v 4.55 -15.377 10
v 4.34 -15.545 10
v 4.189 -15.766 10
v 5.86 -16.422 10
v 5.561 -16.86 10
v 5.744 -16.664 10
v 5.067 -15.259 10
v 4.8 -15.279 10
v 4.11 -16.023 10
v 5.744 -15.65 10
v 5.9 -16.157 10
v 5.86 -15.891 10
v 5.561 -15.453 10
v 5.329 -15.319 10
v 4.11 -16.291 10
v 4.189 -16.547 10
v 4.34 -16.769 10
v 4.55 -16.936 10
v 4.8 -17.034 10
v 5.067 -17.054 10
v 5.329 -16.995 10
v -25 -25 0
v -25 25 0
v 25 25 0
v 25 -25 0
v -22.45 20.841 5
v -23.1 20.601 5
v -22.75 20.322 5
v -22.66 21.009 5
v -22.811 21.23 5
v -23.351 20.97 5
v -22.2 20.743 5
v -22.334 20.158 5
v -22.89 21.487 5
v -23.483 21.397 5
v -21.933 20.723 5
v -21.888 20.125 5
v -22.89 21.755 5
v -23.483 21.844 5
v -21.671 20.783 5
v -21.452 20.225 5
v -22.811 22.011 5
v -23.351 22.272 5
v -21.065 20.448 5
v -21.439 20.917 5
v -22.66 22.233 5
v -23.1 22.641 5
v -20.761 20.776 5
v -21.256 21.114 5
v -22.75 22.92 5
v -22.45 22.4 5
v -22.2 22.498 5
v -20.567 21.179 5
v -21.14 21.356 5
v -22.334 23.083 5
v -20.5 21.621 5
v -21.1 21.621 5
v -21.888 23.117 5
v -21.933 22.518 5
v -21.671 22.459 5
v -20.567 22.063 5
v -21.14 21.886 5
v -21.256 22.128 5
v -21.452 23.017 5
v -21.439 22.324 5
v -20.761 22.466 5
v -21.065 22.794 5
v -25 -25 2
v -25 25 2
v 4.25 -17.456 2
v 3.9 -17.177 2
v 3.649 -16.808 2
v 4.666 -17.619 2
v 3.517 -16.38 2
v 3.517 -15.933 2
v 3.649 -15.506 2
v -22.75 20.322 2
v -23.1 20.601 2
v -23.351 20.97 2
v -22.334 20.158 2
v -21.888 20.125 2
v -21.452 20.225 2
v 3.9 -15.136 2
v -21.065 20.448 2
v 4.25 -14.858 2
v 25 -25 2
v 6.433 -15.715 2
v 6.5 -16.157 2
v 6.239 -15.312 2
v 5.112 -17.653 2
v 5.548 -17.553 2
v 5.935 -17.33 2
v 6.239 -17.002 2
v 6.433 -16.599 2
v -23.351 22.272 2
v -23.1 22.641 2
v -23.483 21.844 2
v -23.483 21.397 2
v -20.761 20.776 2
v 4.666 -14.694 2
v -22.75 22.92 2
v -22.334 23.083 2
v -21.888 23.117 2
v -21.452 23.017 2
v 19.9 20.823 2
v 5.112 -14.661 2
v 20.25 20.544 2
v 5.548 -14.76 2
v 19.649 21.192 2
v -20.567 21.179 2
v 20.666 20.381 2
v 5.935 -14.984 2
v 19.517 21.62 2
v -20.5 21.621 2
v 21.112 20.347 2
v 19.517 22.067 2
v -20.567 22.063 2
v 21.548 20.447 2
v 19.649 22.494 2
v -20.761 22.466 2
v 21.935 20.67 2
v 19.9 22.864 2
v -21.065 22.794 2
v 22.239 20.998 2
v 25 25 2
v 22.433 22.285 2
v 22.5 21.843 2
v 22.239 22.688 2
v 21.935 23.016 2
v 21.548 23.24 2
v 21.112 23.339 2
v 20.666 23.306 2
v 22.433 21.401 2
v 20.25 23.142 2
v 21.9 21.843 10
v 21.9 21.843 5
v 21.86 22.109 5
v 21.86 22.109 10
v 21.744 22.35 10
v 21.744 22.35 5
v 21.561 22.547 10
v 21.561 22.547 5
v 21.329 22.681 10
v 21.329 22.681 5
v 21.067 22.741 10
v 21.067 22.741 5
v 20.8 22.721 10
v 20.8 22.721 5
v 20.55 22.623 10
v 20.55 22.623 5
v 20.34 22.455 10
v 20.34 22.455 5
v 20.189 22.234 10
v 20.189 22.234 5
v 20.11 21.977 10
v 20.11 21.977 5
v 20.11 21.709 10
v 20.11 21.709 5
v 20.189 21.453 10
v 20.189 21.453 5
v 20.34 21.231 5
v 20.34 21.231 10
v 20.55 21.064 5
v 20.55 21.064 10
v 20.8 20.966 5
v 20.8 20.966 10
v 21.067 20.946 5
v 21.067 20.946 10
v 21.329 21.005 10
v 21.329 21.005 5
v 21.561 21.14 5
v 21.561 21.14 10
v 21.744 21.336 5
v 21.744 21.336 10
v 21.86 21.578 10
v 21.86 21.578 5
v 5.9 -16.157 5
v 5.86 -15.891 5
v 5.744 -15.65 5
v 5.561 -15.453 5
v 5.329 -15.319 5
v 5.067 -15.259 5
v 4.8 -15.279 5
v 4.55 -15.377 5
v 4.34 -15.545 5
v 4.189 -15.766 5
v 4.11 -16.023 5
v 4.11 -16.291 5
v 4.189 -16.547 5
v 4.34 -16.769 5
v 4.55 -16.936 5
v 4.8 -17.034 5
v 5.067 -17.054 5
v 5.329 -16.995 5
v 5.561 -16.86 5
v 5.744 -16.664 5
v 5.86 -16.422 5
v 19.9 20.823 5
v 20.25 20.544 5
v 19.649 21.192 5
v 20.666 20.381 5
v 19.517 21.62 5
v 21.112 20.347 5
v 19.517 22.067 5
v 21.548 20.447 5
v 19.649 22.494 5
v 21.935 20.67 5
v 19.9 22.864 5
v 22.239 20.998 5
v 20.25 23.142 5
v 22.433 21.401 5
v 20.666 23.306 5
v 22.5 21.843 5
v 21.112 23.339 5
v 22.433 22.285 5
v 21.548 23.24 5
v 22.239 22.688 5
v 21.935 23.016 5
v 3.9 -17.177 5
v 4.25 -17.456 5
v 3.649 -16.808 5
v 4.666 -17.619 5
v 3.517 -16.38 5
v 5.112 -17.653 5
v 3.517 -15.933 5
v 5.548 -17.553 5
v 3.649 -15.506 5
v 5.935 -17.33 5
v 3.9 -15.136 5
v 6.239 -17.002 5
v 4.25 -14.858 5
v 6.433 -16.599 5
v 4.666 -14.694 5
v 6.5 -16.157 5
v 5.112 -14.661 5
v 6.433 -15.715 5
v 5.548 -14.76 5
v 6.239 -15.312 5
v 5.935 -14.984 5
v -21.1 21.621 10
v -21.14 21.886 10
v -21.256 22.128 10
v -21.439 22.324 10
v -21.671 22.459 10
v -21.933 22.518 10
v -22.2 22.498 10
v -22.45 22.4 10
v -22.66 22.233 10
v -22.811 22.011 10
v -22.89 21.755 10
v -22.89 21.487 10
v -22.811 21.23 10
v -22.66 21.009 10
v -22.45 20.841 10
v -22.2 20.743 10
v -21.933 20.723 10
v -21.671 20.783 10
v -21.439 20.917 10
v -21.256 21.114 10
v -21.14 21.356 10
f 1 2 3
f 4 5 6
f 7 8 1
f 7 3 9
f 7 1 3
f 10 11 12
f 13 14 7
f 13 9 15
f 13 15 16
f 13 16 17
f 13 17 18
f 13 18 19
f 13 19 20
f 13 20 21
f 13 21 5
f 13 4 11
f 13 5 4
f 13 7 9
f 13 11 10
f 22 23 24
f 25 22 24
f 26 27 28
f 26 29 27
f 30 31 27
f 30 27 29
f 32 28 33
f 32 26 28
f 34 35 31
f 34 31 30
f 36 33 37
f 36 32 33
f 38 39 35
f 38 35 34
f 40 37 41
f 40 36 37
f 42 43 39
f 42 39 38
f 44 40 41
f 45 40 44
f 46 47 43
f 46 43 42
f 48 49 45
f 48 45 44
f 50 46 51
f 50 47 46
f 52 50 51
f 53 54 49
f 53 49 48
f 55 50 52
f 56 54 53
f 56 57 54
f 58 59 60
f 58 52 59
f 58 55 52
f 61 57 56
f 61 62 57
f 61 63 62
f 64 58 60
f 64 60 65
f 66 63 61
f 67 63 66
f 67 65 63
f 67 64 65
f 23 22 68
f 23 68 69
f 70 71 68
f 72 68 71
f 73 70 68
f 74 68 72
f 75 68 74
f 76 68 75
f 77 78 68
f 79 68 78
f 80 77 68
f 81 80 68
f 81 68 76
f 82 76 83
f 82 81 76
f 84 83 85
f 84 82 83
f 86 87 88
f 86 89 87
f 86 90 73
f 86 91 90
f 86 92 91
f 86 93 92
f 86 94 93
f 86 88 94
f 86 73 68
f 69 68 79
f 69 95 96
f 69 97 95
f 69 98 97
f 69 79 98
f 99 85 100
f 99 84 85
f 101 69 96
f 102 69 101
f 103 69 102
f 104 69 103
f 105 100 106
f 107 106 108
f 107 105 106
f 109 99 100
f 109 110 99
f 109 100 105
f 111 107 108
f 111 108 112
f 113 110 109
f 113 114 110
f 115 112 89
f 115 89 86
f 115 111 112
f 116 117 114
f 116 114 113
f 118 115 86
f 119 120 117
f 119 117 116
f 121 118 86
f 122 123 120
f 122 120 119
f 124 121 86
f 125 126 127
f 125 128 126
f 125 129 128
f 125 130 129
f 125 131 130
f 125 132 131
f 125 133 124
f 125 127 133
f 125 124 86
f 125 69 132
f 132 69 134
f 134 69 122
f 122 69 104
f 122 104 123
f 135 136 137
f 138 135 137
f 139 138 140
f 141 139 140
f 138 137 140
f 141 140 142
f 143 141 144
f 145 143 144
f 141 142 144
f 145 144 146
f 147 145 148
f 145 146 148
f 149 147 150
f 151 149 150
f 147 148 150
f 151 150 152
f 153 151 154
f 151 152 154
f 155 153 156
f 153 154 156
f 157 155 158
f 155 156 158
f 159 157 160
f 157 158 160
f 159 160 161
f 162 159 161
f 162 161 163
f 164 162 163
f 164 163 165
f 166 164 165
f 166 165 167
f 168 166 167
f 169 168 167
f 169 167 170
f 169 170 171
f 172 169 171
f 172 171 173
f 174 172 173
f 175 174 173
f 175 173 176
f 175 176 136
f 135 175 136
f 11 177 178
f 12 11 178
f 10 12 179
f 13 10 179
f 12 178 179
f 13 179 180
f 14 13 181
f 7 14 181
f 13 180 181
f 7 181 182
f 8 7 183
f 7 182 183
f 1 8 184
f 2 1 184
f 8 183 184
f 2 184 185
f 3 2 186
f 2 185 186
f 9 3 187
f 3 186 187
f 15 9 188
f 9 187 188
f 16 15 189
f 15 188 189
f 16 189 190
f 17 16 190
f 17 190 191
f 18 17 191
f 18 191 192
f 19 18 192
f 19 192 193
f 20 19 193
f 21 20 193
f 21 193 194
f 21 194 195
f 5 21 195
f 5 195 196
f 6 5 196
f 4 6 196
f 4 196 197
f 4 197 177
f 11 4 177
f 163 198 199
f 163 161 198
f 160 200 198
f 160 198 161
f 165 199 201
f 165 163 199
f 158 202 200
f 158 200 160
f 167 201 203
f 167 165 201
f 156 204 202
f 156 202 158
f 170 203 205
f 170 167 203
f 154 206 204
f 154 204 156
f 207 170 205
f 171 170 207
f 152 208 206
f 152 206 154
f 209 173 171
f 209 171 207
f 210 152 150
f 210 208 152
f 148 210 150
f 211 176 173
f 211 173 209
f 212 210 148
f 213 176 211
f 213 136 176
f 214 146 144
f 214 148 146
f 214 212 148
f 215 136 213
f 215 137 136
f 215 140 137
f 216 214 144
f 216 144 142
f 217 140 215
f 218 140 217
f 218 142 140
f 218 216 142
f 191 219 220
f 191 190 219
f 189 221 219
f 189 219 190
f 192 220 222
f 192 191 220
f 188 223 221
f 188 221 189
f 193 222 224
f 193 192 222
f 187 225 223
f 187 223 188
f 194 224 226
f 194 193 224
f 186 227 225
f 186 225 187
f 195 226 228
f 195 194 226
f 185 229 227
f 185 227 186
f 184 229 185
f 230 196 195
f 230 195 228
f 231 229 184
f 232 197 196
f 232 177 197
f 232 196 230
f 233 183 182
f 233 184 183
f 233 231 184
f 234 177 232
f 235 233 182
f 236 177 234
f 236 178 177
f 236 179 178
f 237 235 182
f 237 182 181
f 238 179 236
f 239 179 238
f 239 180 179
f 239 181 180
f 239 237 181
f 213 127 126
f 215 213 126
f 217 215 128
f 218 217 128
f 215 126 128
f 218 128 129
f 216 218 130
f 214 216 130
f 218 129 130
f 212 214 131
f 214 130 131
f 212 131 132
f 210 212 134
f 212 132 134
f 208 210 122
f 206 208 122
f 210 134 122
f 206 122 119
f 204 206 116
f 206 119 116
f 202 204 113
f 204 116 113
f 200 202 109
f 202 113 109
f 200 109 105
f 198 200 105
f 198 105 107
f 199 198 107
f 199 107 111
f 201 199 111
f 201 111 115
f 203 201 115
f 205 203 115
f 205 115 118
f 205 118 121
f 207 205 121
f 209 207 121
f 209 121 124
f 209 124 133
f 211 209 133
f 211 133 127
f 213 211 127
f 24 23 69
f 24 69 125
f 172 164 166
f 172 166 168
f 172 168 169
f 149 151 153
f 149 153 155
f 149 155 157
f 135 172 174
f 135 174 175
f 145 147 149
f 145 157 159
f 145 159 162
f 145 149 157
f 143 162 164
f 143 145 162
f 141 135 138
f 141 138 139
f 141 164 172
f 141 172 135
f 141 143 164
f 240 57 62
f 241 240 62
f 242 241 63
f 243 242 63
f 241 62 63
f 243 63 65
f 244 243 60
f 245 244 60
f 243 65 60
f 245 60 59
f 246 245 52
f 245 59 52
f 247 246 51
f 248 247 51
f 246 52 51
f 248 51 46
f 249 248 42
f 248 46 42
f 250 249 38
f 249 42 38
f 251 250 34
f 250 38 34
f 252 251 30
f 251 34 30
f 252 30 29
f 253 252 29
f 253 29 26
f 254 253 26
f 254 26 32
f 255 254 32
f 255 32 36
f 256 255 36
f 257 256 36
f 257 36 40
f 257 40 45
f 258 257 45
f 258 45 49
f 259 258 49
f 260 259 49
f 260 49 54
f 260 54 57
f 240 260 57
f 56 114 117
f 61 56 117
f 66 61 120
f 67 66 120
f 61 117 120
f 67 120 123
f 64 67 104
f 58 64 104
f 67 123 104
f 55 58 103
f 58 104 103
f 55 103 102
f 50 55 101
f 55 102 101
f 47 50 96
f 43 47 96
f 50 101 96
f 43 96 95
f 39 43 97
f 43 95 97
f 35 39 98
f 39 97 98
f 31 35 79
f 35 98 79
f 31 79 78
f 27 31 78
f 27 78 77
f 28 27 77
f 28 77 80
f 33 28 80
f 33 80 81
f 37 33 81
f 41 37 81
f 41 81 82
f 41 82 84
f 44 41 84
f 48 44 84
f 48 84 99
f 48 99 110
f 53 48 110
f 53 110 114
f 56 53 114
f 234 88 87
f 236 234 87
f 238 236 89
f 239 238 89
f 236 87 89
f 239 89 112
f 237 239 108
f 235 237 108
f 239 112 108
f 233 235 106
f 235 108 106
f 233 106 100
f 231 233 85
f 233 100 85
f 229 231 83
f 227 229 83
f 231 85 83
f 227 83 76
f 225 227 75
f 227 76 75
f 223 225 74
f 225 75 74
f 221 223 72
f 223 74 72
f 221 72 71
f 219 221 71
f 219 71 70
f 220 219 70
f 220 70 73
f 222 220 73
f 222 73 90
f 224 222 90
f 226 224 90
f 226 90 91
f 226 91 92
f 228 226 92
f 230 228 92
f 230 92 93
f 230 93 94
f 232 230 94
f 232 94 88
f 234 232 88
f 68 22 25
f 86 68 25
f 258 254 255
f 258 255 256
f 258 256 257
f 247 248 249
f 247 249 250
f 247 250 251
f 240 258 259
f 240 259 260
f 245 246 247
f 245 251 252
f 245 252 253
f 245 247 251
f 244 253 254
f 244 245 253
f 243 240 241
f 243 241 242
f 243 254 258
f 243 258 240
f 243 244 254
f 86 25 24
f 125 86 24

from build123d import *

# Parameters (mm, degrees)
F0_W     = 50
F0_H     = 50
F0_R     = 1.5
F1_DEPTH = 2
F0_R_2   = 0.9
F2_DEPTH = 5
F3_DEPTH = 10


with BuildPart() as f1:
    # F0 (on Top) → F1 (new body)
    with BuildSketch(Plane.XY):
        Rectangle(F0_W, F0_H)
        with Locations((5, -16.156757)):
            Circle(F0_R, mode=Mode.SUBTRACT)
        with Locations((-22, 21.620819)):
            Circle(F0_R, mode=Mode.SUBTRACT)
        with Locations((21, 21.843243)):
            Circle(F0_R, mode=Mode.SUBTRACT)
    extrude(amount=F1_DEPTH)

    # F0 (on Top) → F2 (join)
    with BuildSketch(Plane.XY):
        with Locations((-22, 21.620819)):
            Circle(F0_R)
        with Locations((-22, 21.620819)):
            Circle(F0_R_2, mode=Mode.SUBTRACT)
        with Locations((21, 21.843243)):
            Circle(F0_R)
        with Locations((21, 21.843243)):
            Circle(F0_R_2, mode=Mode.SUBTRACT)
        with Locations((5, -16.156757)):
            Circle(F0_R)
        with Locations((5, -16.156757)):
            Circle(F0_R_2, mode=Mode.SUBTRACT)
    extrude(amount=F2_DEPTH)

    # F0 (on Top) → F3 (join)
    with BuildSketch(Plane.XY):
        with Locations((-22, 21.620819)):
            Circle(F0_R_2)
        with Locations((21, 21.843243)):
            Circle(F0_R_2)
        with Locations((5, -16.156757)):
            Circle(F0_R_2)
    extrude(amount=F3_DEPTH)


solid = f1.part
